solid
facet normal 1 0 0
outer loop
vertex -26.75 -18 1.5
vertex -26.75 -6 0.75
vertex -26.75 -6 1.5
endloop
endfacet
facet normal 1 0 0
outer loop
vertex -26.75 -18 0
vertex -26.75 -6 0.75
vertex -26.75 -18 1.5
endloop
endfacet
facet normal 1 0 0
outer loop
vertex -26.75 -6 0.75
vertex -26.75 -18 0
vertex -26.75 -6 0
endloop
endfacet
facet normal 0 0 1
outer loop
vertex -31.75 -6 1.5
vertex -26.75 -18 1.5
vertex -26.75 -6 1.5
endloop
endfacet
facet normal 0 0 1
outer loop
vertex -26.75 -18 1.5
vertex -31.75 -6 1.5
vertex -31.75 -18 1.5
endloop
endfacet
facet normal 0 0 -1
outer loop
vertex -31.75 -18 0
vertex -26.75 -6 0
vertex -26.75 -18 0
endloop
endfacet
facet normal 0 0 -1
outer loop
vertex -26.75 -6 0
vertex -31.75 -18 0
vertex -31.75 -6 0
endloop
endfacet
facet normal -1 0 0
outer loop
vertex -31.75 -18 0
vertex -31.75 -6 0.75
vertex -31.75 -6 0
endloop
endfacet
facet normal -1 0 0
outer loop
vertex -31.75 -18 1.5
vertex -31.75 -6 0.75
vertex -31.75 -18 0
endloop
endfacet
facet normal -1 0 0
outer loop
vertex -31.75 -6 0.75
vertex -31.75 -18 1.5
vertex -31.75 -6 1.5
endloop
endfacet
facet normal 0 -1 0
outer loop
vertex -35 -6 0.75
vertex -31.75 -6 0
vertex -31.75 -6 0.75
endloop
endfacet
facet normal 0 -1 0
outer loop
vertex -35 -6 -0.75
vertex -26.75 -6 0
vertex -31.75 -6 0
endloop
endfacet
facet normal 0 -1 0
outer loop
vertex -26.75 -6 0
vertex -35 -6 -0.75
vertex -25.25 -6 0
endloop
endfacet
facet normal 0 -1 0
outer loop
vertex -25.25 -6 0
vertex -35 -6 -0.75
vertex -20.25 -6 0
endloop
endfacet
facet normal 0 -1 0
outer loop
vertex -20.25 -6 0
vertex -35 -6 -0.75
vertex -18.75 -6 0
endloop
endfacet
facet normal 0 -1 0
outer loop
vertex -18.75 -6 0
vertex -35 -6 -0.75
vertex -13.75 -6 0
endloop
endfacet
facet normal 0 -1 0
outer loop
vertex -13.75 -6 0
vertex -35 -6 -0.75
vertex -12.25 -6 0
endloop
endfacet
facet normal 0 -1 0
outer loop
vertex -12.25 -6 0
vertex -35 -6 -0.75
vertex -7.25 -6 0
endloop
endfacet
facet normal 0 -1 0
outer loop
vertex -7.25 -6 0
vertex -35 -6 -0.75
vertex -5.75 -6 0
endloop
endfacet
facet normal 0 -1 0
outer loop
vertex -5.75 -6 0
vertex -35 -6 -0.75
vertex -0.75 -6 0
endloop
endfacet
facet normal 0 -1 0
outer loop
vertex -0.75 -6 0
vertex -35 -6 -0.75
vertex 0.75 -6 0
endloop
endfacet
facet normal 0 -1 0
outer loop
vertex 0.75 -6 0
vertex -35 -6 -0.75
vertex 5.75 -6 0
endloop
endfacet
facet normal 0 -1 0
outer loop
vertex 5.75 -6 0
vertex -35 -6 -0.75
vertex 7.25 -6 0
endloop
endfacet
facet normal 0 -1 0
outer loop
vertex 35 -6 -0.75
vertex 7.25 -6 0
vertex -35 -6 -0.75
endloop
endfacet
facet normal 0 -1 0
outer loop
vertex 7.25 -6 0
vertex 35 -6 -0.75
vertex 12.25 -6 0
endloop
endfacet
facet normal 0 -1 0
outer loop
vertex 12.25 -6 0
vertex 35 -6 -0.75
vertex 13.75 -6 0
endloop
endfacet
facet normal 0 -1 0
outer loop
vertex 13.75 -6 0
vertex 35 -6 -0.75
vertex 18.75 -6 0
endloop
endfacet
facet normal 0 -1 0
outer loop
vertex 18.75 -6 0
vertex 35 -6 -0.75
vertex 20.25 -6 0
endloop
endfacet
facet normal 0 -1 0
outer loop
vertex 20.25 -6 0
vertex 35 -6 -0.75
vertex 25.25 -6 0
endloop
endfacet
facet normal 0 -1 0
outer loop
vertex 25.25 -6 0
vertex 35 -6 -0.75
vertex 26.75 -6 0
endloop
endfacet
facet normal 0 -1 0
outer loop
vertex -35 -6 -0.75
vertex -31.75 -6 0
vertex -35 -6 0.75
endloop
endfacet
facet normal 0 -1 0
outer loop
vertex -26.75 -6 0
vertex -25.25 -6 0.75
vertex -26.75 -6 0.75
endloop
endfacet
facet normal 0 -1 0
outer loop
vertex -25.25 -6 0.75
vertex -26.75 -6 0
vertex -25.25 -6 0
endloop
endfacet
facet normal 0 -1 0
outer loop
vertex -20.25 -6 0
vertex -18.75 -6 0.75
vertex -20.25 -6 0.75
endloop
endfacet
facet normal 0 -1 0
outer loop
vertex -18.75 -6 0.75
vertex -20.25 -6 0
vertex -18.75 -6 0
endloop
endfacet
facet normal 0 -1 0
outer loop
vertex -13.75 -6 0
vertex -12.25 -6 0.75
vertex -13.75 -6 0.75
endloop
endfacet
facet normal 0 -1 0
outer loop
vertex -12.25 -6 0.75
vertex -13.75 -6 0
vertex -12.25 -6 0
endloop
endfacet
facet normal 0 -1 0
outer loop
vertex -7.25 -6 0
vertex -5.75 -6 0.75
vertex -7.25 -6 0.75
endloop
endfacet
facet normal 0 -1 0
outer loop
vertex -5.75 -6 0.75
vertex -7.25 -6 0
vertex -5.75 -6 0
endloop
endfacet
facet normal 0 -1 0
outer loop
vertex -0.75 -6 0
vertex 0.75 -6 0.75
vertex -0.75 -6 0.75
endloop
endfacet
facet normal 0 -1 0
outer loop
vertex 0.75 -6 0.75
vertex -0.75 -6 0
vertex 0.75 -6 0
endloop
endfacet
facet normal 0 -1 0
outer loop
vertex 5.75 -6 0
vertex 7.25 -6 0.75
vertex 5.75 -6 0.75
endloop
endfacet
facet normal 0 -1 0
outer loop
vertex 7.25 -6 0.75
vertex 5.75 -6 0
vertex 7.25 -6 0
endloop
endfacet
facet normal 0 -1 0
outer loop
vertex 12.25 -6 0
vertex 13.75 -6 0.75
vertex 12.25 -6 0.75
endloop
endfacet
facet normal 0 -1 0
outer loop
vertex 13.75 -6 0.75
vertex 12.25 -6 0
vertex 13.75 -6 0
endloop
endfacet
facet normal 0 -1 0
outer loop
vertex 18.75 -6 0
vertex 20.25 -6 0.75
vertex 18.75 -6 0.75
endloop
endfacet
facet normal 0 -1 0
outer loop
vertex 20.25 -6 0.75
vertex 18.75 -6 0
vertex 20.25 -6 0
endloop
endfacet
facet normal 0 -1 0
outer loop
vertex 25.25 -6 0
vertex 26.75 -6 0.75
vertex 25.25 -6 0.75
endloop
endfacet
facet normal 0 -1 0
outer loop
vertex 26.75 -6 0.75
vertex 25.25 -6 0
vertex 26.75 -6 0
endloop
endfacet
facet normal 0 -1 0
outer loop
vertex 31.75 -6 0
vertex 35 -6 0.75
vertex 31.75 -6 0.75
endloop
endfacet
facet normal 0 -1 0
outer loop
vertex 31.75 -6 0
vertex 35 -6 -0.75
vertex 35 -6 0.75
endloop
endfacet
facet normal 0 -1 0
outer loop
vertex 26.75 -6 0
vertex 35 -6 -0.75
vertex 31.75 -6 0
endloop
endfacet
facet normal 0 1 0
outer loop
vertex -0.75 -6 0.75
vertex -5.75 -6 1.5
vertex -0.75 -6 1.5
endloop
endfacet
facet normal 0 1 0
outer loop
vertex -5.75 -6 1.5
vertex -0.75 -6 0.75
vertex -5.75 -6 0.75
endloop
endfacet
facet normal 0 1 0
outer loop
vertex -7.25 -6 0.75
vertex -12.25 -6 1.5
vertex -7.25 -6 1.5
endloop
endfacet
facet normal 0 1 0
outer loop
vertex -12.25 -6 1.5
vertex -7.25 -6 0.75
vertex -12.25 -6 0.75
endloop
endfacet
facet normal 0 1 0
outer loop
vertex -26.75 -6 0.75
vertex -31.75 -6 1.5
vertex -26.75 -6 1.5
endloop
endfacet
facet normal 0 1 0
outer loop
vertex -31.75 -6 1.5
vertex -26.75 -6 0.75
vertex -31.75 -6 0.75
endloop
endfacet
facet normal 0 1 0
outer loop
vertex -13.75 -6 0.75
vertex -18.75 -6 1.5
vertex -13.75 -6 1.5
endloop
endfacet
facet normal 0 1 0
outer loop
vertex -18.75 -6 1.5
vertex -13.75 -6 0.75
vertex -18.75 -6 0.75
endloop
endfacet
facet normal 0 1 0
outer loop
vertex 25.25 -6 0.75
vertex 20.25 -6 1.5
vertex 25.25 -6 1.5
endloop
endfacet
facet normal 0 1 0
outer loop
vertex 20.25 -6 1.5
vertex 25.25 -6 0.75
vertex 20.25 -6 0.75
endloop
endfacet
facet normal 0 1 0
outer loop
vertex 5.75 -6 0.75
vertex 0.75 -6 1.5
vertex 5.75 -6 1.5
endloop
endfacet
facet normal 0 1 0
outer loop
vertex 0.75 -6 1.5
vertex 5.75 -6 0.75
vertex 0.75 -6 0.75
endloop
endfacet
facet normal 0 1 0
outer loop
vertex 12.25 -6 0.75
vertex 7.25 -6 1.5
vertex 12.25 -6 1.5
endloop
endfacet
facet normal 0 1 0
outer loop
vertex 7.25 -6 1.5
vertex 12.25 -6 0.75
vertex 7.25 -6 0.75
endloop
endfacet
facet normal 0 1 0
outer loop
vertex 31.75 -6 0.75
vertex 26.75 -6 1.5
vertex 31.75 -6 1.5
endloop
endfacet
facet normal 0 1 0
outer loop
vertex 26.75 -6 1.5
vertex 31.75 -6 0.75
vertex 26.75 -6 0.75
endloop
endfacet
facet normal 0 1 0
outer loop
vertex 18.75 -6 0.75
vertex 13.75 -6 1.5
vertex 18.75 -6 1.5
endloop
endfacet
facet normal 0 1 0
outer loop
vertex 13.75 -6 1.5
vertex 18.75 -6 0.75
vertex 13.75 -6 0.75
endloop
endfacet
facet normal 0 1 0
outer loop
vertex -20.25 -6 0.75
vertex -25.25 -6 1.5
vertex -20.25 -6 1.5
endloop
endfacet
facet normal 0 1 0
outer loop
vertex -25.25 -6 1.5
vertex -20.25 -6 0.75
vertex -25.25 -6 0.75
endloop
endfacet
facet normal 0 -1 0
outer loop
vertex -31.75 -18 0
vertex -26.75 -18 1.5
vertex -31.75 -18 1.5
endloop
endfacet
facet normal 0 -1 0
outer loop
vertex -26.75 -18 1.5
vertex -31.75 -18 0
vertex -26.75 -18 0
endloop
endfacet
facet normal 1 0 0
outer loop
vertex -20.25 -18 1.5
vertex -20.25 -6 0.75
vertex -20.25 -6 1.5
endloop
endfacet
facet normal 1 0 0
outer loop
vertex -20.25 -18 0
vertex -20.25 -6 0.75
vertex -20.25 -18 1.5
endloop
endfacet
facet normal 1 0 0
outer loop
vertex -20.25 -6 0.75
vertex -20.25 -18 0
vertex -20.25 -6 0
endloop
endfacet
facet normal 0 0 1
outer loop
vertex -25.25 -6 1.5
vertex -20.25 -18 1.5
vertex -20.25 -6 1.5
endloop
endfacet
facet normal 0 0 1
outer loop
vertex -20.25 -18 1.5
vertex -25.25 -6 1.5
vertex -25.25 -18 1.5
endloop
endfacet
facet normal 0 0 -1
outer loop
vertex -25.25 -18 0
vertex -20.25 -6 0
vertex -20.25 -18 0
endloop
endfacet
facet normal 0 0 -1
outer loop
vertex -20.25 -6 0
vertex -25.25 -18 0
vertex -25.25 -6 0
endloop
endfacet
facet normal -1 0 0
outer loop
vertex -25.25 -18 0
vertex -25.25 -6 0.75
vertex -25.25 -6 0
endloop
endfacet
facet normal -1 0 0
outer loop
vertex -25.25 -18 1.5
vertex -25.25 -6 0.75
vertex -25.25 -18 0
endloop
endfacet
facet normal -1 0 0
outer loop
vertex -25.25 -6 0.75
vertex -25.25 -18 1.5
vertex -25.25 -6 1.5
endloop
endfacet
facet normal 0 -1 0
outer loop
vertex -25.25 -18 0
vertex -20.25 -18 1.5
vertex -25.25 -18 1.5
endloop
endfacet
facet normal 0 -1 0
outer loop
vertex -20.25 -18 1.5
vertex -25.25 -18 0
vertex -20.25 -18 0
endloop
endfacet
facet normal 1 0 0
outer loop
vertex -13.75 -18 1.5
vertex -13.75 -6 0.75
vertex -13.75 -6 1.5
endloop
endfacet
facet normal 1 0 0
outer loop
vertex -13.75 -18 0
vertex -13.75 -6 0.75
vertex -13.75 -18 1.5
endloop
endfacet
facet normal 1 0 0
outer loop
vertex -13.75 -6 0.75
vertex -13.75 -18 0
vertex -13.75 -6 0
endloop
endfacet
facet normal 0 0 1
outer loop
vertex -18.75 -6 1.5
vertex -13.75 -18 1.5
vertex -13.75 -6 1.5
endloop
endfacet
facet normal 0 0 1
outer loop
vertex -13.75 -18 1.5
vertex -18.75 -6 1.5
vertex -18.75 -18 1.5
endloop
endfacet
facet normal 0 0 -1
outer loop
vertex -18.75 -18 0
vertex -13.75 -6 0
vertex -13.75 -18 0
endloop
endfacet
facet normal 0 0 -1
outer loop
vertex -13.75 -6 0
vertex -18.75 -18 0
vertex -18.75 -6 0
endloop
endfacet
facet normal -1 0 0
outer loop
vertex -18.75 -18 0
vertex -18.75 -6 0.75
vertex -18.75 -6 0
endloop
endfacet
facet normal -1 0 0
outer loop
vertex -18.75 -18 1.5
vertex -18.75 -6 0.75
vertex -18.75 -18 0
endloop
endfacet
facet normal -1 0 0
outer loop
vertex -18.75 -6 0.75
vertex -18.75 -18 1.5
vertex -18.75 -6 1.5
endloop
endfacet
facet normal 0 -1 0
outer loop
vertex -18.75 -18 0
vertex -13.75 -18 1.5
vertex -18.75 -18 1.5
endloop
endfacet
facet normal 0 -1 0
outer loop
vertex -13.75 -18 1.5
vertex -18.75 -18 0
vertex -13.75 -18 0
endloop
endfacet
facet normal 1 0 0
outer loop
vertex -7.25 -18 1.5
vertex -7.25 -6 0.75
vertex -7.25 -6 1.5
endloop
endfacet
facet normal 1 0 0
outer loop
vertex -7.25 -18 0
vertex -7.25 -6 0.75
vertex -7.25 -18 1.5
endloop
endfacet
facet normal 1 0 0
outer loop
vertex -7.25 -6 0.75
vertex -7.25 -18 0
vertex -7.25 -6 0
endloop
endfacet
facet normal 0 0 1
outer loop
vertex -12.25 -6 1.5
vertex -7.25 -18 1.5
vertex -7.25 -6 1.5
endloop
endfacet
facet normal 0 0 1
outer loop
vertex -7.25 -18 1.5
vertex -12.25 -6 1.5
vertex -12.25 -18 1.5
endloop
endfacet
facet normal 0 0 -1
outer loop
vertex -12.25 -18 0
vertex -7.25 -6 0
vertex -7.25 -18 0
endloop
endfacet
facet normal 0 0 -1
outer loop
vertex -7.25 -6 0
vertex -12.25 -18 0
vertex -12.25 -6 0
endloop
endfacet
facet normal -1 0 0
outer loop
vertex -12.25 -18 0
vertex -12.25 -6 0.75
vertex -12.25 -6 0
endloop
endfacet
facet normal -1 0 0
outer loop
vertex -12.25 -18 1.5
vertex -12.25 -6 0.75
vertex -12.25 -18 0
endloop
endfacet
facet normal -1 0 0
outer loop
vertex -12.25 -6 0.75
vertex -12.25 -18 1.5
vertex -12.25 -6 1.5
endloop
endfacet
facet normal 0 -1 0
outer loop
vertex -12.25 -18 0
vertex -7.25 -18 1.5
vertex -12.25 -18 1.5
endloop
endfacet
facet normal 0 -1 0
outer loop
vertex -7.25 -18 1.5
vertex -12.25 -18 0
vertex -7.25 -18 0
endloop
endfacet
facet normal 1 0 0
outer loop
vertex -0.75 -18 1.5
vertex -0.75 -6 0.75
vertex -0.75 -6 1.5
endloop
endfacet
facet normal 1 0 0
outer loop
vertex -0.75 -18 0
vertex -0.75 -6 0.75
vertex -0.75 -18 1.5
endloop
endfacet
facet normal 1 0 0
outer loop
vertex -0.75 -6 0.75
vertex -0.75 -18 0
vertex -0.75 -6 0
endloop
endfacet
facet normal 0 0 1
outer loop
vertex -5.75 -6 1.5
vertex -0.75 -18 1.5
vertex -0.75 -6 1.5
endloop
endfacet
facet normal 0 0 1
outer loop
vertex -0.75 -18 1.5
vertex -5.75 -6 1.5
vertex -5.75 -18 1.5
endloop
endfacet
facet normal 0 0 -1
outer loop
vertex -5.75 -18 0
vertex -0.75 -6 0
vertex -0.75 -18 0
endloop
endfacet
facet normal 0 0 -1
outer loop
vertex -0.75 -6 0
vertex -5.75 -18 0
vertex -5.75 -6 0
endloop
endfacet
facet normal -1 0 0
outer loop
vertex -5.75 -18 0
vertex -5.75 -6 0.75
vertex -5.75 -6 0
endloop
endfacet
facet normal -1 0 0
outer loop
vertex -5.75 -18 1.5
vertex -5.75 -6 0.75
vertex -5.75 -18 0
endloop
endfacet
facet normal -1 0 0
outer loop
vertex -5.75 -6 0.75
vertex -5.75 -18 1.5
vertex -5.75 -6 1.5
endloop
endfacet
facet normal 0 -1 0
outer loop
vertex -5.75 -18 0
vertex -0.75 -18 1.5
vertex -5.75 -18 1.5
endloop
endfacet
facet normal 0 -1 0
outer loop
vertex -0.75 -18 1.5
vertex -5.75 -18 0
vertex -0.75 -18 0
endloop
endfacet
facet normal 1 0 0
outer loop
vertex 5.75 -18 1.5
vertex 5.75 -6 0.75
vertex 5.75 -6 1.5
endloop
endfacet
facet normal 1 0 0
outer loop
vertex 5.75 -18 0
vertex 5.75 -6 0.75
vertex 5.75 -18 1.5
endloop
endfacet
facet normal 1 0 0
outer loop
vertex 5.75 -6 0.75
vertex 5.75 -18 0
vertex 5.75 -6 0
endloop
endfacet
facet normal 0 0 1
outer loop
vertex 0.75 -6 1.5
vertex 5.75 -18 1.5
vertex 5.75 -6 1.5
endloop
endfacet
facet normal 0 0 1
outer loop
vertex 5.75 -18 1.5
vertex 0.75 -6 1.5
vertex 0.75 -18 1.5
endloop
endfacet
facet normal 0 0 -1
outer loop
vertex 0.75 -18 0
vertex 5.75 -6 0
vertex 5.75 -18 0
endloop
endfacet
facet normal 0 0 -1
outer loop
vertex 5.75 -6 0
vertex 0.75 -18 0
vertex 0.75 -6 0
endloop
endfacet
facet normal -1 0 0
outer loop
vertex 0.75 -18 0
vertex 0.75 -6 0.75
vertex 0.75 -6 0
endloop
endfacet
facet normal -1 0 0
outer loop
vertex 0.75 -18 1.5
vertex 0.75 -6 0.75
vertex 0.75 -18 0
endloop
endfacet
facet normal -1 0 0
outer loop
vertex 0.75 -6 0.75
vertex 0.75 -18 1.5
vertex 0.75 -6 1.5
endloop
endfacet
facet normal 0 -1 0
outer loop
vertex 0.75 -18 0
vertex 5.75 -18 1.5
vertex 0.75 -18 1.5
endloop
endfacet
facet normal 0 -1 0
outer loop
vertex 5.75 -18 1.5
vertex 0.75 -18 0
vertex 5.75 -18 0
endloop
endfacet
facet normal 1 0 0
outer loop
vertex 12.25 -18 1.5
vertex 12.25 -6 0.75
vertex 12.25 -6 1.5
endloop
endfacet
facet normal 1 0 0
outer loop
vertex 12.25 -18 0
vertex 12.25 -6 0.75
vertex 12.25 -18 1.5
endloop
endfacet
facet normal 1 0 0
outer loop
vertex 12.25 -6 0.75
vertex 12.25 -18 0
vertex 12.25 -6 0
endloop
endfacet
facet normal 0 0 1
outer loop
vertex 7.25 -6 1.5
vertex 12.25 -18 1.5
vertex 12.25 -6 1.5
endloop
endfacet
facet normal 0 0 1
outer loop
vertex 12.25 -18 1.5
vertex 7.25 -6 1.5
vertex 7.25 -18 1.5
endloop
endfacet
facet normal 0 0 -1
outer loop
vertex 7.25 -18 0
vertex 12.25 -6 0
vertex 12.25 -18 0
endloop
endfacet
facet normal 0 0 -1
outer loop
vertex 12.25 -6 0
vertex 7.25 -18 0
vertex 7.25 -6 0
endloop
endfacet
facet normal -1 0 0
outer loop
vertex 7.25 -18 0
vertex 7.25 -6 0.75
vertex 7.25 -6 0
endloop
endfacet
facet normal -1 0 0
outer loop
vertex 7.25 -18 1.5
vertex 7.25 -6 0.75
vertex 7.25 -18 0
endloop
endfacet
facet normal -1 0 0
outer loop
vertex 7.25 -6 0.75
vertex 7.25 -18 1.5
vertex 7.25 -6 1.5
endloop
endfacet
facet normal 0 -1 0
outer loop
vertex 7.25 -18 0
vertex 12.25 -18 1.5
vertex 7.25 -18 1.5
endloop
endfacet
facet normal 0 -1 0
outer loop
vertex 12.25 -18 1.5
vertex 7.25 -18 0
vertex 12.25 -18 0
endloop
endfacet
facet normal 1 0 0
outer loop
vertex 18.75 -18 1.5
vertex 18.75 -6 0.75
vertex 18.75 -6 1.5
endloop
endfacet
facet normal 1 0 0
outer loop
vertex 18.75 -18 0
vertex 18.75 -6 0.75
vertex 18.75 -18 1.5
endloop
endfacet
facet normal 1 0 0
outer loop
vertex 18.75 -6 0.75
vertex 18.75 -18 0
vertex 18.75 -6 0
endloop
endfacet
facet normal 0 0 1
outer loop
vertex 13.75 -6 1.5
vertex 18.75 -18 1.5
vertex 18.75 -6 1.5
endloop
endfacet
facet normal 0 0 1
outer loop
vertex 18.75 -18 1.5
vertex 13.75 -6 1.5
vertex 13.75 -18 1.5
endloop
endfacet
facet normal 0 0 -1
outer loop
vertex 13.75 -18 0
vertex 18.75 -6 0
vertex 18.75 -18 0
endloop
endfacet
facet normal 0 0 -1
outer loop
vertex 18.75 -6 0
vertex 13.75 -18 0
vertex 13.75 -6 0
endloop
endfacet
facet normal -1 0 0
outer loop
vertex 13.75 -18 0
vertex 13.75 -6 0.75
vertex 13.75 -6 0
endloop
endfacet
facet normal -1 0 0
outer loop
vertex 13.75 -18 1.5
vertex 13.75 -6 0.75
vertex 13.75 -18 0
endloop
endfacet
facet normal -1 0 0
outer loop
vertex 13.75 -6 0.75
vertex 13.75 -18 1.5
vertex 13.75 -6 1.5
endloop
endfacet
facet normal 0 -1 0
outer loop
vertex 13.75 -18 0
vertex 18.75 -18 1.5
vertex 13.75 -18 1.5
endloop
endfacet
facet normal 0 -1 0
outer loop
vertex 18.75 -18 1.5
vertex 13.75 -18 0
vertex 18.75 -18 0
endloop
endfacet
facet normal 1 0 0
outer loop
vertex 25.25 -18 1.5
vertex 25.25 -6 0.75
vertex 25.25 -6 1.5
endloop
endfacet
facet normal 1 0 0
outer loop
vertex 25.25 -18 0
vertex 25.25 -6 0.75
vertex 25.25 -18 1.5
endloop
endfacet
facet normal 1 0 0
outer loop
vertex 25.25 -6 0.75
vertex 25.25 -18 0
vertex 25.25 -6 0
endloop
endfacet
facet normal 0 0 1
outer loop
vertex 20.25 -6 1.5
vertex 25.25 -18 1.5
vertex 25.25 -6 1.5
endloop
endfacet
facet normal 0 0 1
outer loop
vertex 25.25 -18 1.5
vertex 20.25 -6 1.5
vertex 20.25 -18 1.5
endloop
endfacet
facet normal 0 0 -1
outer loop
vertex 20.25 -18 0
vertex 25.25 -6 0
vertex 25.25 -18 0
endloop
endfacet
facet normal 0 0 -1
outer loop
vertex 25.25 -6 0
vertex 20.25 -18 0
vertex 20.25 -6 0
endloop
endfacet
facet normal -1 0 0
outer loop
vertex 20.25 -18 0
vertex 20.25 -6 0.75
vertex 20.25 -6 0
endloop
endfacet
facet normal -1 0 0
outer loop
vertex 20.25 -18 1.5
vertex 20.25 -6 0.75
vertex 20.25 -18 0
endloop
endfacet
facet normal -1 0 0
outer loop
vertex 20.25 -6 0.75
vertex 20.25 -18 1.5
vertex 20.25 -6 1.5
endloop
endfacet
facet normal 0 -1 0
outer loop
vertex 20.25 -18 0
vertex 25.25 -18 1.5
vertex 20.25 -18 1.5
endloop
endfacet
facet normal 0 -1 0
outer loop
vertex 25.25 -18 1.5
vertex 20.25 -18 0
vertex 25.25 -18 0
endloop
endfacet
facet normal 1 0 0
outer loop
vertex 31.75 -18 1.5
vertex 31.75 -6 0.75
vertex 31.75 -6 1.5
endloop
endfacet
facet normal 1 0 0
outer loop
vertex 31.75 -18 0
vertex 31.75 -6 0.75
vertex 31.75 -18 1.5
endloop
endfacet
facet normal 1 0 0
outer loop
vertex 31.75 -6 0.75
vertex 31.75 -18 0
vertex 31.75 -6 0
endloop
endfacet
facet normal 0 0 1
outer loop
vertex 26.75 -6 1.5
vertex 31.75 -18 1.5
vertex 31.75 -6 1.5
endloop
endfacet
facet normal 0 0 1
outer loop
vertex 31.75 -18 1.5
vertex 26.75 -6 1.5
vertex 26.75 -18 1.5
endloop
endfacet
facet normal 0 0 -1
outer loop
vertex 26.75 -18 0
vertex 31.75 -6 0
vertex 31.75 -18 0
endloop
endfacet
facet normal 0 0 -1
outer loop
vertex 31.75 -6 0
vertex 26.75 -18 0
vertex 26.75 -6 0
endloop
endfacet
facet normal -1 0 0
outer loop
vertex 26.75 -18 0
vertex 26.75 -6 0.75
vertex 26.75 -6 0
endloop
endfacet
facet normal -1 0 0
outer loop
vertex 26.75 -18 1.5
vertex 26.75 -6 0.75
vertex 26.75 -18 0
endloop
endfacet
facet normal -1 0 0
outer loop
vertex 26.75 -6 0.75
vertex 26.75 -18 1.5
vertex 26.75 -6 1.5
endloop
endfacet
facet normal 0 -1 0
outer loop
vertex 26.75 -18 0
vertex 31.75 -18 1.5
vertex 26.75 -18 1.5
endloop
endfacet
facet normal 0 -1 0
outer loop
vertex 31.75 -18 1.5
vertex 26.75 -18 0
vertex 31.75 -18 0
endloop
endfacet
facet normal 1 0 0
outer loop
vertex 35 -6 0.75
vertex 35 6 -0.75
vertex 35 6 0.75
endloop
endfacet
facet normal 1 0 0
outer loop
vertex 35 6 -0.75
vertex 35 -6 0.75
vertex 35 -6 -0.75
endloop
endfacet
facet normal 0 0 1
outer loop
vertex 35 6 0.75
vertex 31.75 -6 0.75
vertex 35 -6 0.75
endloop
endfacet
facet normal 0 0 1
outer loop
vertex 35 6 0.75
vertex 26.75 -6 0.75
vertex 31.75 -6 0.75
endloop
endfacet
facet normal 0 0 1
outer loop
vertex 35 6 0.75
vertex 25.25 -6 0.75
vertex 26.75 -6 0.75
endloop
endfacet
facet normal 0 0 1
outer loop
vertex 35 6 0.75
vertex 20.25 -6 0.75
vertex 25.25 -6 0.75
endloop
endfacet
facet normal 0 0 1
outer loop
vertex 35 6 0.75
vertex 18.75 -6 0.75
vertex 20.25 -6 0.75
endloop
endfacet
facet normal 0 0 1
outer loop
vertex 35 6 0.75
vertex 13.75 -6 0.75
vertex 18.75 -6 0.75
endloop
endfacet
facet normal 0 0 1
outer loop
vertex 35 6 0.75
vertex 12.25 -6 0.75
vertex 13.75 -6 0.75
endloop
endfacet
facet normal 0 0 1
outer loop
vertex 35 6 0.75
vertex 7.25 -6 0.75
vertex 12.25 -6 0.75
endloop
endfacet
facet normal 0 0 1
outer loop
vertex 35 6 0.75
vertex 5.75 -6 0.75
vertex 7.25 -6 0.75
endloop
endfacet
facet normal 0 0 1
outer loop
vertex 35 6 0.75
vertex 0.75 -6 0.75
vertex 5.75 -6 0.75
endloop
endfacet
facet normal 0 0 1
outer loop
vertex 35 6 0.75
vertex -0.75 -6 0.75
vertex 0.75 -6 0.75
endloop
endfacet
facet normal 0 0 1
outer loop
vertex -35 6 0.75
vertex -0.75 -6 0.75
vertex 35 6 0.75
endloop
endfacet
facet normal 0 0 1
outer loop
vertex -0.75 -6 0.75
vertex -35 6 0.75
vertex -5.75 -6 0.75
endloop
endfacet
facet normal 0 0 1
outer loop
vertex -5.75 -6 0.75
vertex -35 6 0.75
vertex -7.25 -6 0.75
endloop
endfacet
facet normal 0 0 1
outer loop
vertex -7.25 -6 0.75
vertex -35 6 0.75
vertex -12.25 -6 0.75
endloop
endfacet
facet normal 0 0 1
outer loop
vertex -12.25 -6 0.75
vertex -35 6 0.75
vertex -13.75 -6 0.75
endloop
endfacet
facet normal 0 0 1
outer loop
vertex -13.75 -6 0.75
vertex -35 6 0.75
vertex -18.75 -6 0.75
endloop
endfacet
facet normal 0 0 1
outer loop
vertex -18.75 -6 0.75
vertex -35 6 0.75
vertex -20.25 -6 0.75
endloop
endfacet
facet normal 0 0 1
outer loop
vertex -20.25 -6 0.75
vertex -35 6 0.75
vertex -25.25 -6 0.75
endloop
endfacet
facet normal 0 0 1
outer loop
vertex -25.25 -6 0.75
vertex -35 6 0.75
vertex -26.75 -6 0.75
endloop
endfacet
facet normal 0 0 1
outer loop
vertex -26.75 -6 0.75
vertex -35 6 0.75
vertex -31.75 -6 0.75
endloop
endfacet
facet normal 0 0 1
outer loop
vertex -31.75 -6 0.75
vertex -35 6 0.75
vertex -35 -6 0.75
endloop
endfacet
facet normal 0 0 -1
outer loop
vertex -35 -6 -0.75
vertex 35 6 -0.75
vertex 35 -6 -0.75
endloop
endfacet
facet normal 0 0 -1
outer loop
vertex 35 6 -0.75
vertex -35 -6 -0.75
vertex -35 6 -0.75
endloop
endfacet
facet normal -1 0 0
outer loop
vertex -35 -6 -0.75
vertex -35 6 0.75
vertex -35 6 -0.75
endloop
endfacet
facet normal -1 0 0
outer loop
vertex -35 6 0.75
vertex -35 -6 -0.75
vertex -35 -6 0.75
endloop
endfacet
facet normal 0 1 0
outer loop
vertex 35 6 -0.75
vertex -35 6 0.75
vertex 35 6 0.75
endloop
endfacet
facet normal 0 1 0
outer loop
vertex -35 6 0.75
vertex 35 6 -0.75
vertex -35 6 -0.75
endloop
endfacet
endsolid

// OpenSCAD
$fn = 64;

spine_length = 70;    // mm, length of the spine (X-axis)
spine_width = 12;    // mm, width of the spine (Y-axis)
tooth_width = 5.0;   // mm, width of each tooth (X-axis)
tooth_length = 12;    // mm, length of each tooth (Y-axis, extending from spine)
gap = 1.5;           // mm, gap between neighbouring teeth (X-axis)
num_teeth = 10;      // number of teeth
thickness = 1.5;   // mm, thickness of the comb (Z-axis)

total_teeth_width = num_teeth * tooth_width + (num_teeth - 1) * gap;
start_x = -total_teeth_width / 2;

union() {
  // Spine: centered at origin (X and Y), 70mm x 12mm x 1.5mm
  cube([spine_length, spine_width, thickness], center = true);
  
  // Teeth: 10 teeth, each 5.0mm x 12mm x 1.5mm, placed along the spine's bottom edge
  for (i = [0 : num_teeth - 1]) {
    x_pos = start_x + i * (tooth_width + gap);
    translate([x_pos, -18, 0])
      cube([tooth_width, tooth_length, thickness]);
  }
}
translate([0, 6, 0]); // Center entire comb at origin (X and Y)
